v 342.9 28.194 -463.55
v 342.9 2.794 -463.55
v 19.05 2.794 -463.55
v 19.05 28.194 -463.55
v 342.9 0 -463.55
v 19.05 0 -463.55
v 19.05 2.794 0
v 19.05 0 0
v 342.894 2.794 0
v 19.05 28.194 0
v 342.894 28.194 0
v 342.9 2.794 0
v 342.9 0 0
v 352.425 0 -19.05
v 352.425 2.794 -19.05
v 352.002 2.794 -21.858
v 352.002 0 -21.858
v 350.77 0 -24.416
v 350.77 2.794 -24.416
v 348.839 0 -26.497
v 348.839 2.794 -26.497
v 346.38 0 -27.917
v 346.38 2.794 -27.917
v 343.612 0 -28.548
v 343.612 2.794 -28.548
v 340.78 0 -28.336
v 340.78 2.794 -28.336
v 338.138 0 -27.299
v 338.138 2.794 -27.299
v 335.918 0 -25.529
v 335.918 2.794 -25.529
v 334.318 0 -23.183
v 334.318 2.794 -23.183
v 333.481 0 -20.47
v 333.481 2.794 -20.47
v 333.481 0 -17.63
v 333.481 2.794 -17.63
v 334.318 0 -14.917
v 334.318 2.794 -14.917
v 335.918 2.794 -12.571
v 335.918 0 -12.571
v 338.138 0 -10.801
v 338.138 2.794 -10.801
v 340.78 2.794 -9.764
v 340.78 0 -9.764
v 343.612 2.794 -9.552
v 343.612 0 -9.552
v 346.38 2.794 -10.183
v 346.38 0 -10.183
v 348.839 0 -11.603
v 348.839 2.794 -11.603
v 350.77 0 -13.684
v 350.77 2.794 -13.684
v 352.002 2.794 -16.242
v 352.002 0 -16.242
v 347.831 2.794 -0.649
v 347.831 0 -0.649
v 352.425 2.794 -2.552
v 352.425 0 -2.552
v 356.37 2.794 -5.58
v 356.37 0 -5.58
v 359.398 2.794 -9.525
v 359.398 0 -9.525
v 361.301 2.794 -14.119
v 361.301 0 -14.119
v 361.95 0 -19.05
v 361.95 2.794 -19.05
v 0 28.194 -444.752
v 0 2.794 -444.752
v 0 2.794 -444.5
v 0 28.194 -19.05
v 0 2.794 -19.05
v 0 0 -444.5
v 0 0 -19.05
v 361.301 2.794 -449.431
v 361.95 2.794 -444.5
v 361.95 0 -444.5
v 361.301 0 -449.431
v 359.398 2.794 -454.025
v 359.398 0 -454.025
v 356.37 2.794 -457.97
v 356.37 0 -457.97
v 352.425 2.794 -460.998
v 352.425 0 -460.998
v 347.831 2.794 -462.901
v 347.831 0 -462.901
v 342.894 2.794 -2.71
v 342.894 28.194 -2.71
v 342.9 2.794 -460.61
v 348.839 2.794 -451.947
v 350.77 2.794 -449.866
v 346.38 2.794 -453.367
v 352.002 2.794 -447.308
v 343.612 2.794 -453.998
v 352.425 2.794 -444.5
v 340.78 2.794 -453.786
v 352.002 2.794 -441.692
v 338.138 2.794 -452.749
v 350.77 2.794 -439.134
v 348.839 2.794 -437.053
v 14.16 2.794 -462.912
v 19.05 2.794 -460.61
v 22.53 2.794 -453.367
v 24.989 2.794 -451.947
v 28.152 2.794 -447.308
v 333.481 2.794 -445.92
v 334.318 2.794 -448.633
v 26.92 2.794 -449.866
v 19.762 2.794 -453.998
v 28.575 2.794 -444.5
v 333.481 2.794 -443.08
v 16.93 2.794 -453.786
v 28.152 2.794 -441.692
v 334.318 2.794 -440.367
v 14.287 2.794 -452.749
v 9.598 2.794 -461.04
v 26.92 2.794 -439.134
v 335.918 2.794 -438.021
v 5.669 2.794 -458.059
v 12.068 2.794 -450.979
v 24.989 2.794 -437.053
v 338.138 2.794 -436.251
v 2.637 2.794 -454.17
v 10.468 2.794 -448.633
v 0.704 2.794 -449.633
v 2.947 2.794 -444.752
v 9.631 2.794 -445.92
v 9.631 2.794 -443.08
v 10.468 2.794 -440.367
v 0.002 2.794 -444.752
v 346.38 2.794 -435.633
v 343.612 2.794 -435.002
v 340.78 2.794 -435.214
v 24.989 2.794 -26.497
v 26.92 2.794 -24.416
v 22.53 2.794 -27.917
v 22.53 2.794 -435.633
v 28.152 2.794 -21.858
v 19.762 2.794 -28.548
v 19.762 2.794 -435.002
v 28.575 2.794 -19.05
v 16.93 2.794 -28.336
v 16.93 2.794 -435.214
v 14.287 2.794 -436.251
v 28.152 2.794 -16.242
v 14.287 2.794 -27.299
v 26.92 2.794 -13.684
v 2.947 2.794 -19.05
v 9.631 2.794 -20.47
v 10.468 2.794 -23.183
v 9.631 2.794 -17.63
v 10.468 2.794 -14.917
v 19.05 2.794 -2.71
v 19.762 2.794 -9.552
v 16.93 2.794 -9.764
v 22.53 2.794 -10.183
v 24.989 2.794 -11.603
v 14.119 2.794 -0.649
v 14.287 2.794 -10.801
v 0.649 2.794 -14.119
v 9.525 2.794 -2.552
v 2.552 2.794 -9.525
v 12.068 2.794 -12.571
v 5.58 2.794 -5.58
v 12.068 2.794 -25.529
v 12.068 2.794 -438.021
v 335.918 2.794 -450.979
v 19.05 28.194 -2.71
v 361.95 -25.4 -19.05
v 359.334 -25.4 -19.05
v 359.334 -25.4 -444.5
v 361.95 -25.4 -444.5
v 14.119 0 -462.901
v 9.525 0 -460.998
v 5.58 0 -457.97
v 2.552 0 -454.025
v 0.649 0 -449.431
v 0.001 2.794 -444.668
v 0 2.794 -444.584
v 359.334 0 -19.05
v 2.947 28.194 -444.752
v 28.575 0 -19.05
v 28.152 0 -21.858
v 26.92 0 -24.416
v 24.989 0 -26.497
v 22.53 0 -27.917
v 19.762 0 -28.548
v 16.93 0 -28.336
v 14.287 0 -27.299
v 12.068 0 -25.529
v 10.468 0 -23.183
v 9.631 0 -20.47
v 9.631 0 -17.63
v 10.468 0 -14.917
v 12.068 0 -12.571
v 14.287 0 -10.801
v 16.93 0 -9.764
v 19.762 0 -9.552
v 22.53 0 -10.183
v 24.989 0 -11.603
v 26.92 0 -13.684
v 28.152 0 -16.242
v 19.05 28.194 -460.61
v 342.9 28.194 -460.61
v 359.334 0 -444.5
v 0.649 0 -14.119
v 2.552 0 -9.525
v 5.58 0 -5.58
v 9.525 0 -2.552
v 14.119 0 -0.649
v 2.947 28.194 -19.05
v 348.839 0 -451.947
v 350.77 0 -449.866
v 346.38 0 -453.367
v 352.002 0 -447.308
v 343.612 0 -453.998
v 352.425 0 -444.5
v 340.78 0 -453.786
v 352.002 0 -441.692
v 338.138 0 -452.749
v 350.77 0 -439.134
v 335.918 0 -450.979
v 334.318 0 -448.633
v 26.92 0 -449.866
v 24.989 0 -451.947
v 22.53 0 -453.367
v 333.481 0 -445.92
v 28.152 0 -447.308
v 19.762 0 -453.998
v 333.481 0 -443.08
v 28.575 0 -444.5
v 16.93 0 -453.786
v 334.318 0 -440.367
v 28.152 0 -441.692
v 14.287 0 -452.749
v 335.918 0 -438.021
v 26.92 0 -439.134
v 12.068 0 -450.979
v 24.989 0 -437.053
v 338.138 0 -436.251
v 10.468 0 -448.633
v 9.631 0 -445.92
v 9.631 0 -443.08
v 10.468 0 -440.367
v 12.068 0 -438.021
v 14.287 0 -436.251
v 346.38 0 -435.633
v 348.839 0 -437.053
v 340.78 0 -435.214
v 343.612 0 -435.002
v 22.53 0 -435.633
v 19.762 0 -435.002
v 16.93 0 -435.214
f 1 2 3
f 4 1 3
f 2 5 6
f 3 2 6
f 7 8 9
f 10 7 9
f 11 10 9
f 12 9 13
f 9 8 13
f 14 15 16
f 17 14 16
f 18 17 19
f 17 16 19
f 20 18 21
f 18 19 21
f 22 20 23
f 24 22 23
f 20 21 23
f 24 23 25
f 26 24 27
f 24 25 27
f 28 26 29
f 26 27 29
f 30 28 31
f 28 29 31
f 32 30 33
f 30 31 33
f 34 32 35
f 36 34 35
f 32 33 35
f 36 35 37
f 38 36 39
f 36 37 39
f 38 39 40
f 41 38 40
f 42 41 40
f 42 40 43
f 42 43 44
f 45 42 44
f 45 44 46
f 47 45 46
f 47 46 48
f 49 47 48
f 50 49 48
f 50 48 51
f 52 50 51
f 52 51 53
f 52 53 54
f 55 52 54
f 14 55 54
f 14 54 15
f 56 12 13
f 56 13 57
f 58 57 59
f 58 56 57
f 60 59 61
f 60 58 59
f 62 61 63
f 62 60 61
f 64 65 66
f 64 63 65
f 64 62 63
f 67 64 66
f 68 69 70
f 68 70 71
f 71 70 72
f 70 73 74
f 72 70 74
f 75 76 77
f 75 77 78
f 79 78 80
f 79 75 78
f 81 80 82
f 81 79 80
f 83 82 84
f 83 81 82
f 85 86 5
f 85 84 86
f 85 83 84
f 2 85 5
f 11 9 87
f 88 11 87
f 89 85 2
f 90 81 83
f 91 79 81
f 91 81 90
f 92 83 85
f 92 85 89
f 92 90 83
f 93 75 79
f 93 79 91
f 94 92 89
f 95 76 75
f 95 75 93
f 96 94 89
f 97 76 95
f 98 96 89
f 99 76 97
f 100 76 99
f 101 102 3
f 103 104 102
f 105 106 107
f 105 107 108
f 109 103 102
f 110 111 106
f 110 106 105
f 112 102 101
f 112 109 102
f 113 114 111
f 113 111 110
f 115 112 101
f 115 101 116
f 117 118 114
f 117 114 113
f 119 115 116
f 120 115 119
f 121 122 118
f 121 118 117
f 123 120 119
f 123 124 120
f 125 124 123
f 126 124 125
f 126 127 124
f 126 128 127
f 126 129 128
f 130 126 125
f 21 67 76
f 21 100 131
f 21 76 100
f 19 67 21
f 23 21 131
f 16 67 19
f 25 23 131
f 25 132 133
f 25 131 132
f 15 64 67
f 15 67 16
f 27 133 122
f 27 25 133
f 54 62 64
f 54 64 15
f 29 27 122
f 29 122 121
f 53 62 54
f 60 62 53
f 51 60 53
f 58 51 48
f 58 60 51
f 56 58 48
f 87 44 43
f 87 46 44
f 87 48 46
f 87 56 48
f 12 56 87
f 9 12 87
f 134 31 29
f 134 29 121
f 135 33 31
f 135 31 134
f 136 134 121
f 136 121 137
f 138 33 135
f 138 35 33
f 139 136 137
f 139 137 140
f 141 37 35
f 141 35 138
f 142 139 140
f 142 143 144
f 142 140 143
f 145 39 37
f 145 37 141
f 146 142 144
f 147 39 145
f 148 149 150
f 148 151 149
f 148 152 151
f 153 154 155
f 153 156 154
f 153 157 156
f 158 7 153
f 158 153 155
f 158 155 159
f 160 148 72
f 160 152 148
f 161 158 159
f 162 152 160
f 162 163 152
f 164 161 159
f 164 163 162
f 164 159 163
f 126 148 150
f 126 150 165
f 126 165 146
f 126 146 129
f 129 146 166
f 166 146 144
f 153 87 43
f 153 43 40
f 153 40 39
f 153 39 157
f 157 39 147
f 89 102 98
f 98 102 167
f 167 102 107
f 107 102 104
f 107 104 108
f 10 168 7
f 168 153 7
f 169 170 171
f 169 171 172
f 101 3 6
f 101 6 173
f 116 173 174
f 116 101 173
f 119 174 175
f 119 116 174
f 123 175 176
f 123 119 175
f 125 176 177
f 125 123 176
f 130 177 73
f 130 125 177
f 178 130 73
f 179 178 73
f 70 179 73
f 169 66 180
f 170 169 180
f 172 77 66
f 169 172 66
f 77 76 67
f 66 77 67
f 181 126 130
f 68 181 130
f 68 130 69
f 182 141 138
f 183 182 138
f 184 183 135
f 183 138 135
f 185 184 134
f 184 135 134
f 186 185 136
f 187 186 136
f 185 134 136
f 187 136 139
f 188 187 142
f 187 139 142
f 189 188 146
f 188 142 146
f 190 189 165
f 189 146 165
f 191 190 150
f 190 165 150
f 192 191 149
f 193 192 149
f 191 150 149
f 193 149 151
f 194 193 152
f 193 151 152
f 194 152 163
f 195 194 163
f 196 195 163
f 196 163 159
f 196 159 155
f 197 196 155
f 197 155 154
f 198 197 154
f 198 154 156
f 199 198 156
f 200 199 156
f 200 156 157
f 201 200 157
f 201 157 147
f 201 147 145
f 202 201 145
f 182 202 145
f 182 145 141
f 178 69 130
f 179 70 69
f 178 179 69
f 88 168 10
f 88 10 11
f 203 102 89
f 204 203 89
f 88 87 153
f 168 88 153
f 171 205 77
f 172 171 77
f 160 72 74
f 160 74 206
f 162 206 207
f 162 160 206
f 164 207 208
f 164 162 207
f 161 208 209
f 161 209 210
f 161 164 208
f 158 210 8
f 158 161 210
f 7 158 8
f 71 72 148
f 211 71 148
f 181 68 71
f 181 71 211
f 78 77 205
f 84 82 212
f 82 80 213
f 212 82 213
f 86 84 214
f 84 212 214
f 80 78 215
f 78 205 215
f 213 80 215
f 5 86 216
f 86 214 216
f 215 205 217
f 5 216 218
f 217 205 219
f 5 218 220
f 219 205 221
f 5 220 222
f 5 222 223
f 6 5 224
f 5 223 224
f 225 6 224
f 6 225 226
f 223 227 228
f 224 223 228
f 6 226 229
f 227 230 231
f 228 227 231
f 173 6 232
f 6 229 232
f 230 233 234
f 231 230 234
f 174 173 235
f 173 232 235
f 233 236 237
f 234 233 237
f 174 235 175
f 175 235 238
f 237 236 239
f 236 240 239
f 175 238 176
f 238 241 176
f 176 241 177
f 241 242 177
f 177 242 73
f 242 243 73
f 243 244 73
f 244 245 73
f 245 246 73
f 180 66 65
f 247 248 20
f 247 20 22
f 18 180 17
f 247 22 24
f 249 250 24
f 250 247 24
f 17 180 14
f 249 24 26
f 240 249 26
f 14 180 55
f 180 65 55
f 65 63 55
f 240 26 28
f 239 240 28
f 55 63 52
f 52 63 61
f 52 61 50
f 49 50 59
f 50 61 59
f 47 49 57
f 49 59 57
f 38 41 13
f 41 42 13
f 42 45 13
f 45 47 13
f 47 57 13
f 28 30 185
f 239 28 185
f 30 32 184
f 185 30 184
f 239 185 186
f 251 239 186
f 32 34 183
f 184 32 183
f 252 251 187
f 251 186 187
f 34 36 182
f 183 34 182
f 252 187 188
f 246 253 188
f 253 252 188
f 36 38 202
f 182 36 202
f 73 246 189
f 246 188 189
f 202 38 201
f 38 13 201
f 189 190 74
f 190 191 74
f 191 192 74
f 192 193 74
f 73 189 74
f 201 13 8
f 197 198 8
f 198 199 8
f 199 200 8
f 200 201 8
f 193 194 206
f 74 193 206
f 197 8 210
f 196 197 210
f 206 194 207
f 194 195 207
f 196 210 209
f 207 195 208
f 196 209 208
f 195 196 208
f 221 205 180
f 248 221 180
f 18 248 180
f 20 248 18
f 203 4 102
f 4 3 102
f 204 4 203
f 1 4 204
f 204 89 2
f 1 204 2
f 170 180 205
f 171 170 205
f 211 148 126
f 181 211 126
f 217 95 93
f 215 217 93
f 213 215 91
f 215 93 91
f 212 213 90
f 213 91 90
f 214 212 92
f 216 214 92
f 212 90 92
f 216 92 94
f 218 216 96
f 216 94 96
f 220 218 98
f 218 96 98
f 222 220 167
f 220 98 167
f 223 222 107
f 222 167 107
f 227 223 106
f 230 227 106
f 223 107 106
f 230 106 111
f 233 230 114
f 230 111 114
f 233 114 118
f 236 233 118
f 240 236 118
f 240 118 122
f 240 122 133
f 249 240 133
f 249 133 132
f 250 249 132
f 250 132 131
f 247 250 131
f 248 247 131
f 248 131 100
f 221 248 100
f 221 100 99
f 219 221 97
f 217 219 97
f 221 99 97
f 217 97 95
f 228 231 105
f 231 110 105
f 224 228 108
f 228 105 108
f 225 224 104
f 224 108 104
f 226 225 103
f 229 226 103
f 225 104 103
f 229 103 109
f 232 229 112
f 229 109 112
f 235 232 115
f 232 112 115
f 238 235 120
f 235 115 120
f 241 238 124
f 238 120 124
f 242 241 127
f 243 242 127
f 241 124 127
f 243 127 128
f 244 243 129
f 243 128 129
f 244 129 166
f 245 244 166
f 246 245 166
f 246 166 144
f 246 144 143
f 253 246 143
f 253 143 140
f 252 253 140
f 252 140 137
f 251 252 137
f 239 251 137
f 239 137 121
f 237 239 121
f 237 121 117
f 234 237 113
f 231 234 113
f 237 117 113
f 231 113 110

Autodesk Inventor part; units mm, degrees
ref_plane "YZ Plane" through (0, 0, 0) normal (1, 0, 0) x (0, 1, 0)
ref_plane "XZ Plane" through (0, 0, 0) normal (0, 1, 0) x (-1, 0, 0)
ref_plane "XY Plane" through (0, 0, 0) normal (0, 0, 1) x (1, 0, 0)
sketch "Sketch1" plane through (0, 0, 0) normal (0, 1, 0) x (-1, 0, 0)
  line L0 (0, 0) -> (-361.95, 0)
  line L1 (-361.95, 0) -> (-361.95, -463.55)
  line L2 (-361.95, -463.55) -> (0, -463.55)
  line L3 (0, -463.55) -> (0, 0)
  dimension "d0" = 361.95
  dimension "d1" = 463.55
extrude "Extrusion1" add sketch "Sketch1" along normal blind 2.794
fillet "Fillet1" radius 19.05 4 edges at (361.95, 1.397, 0) (361.95, 1.397, -463.55) (0, 1.397, -463.55) (0, 1.397, 0)
sketch "Sketch3" plane through (0, 0, 0) normal (0, -1, 0) x (1, 0, 0)
  line L0 (361.95, -19.05) -> (359.3341, -19.05)
  line L1 (359.3341, -19.05) -> (359.3341, -444.5)
  line L2 (359.3341, -444.5) -> (361.95, -444.5)
  line L3 (361.95, -444.5) -> (361.95, -19.05)
  point P0 (0, 0)
extrude "Extrusion2" add sketch "Sketch3" along normal blind 25.4
sketch "Sketch4" plane through (0, 2.794, 0) normal (0, 1, 0) x (1, 0, 0)
  line L0 (19.05, 0) -> (342.8936, 0)
  line L1 (342.8936, 0) -> (342.8936, 2.7101)
  line L2 (342.8936, 2.7101) -> (19.05, 2.7101)
  line L3 (19.05, 2.7101) -> (19.05, 0)
  line L4 (0, 19.05) -> (2.9466, 19.05)
  line L5 (2.9466, 19.05) -> (2.9466, 444.7516)
  line L6 (2.9466, 444.7516) -> (0, 444.7516)
  line L7 (0, 444.7516) -> (0, 19.05)
  line L8 (342.9, 463.55) -> (19.05, 463.55)
  line L9 (19.05, 463.55) -> (19.05, 460.6098)
  line L10 (19.05, 460.6098) -> (342.9, 460.6098)
  line L11 (342.9, 460.6098) -> (342.9, 463.55)
  point P0 (0, 0)
extrude "Extrusion3" add sketch "Sketch4" along normal blind 25.4
sketch "Sketch5" plane through (0, 2.794, 0) normal (0, 1, 0) x (1, 0, 0)
  line L0 (19.05, 460.6098) -> (19.05, 463.55) projected
  arc A0 (19.05, 463.55) -> (0.0017, 444.7516) centre (19.05, 444.5) ccw projected
  line L1 (0.0017, 444.7516) -> (2.9466, 444.7516) projected
  line L2 (2.9466, 444.7516) -> (2.9466, 19.05) projected
  line L3 (2.9466, 19.05) -> (0, 19.05) projected
  arc A1 (0, 19.05) -> (19.05, 0) centre (19.05, 19.05) ccw projected
  line L4 (19.05, 0) -> (19.05, 2.7101) projected
  line L5 (19.05, 2.7101) -> (342.8936, 2.7101) projected
  line L6 (342.8936, 2.7101) -> (342.8936, 0) projected
  line L7 (342.8936, 0) -> (342.9, 0) projected
  arc A2 (342.9, 0) -> (361.95, 19.05) centre (342.9, 19.05) ccw projected
  line L8 (361.95, 19.05) -> (361.95, 444.5) projected
  arc A3 (361.95, 444.5) -> (342.9, 463.55) centre (342.9, 444.5) ccw projected
  line L9 (342.9, 463.55) -> (342.9, 460.6098) projected
  line L10 (342.9, 460.6098) -> (19.05, 460.6098) projected
  circle A4 centre (19.05, 19.05) radius 9.525
  circle A5 centre (19.05, 444.5) radius 9.525
  point P0 (0, 0)
  dimension "d11" = 19.05
  dimension "d12" = 19.05
extrude "Extrusion4" cut sketch "Sketch5" against normal blind 25.4 contours A4 | A5
sketch "Sketch6" plane through (0, 2.794, 0) normal (0, 1, 0) x (1, 0, 0)
  circle A0 centre (19.05, 19.05) radius 9.525 projected
  circle A1 centre (19.05, 444.5) radius 9.525 projected
  line L0 (19.05, 460.6098) -> (19.05, 463.55) projected
  arc A2 (19.05, 463.55) -> (0.0017, 444.7516) centre (19.05, 444.5) ccw projected
  line L1 (0.0017, 444.7516) -> (2.9466, 444.7516) projected
  line L2 (2.9466, 444.7516) -> (2.9466, 19.05) projected
  line L3 (2.9466, 19.05) -> (0, 19.05) projected
  arc A3 (0, 19.05) -> (19.05, 0) centre (19.05, 19.05) ccw projected
  line L4 (19.05, 0) -> (19.05, 2.7101) projected
  line L5 (19.05, 2.7101) -> (342.8936, 2.7101) projected
  line L6 (342.8936, 2.7101) -> (342.8936, 0) projected
  line L7 (342.8936, 0) -> (342.9, 0) projected
  arc A4 (342.9, 0) -> (361.95, 19.05) centre (342.9, 19.05) ccw projected
  line L8 (361.95, 19.05) -> (361.95, 444.5) projected
  arc A5 (361.95, 444.5) -> (342.9, 463.55) centre (342.9, 444.5) ccw projected
  line L9 (342.9, 463.55) -> (342.9, 460.6098) projected
  line L10 (342.9, 460.6098) -> (19.05, 460.6098) projected
  circle A6 centre (342.9, 19.05) radius 9.525
  circle A7 centre (342.9, 444.5) radius 9.525
  point P0 (0, 0)
  dimension "d15" = 19.05
  dimension "d16" = 19.05
extrude "Extrusion5" cut sketch "Sketch6" against normal blind 25.4 contours A6 | A7
properties part number "Cart_MID_SHELF"
